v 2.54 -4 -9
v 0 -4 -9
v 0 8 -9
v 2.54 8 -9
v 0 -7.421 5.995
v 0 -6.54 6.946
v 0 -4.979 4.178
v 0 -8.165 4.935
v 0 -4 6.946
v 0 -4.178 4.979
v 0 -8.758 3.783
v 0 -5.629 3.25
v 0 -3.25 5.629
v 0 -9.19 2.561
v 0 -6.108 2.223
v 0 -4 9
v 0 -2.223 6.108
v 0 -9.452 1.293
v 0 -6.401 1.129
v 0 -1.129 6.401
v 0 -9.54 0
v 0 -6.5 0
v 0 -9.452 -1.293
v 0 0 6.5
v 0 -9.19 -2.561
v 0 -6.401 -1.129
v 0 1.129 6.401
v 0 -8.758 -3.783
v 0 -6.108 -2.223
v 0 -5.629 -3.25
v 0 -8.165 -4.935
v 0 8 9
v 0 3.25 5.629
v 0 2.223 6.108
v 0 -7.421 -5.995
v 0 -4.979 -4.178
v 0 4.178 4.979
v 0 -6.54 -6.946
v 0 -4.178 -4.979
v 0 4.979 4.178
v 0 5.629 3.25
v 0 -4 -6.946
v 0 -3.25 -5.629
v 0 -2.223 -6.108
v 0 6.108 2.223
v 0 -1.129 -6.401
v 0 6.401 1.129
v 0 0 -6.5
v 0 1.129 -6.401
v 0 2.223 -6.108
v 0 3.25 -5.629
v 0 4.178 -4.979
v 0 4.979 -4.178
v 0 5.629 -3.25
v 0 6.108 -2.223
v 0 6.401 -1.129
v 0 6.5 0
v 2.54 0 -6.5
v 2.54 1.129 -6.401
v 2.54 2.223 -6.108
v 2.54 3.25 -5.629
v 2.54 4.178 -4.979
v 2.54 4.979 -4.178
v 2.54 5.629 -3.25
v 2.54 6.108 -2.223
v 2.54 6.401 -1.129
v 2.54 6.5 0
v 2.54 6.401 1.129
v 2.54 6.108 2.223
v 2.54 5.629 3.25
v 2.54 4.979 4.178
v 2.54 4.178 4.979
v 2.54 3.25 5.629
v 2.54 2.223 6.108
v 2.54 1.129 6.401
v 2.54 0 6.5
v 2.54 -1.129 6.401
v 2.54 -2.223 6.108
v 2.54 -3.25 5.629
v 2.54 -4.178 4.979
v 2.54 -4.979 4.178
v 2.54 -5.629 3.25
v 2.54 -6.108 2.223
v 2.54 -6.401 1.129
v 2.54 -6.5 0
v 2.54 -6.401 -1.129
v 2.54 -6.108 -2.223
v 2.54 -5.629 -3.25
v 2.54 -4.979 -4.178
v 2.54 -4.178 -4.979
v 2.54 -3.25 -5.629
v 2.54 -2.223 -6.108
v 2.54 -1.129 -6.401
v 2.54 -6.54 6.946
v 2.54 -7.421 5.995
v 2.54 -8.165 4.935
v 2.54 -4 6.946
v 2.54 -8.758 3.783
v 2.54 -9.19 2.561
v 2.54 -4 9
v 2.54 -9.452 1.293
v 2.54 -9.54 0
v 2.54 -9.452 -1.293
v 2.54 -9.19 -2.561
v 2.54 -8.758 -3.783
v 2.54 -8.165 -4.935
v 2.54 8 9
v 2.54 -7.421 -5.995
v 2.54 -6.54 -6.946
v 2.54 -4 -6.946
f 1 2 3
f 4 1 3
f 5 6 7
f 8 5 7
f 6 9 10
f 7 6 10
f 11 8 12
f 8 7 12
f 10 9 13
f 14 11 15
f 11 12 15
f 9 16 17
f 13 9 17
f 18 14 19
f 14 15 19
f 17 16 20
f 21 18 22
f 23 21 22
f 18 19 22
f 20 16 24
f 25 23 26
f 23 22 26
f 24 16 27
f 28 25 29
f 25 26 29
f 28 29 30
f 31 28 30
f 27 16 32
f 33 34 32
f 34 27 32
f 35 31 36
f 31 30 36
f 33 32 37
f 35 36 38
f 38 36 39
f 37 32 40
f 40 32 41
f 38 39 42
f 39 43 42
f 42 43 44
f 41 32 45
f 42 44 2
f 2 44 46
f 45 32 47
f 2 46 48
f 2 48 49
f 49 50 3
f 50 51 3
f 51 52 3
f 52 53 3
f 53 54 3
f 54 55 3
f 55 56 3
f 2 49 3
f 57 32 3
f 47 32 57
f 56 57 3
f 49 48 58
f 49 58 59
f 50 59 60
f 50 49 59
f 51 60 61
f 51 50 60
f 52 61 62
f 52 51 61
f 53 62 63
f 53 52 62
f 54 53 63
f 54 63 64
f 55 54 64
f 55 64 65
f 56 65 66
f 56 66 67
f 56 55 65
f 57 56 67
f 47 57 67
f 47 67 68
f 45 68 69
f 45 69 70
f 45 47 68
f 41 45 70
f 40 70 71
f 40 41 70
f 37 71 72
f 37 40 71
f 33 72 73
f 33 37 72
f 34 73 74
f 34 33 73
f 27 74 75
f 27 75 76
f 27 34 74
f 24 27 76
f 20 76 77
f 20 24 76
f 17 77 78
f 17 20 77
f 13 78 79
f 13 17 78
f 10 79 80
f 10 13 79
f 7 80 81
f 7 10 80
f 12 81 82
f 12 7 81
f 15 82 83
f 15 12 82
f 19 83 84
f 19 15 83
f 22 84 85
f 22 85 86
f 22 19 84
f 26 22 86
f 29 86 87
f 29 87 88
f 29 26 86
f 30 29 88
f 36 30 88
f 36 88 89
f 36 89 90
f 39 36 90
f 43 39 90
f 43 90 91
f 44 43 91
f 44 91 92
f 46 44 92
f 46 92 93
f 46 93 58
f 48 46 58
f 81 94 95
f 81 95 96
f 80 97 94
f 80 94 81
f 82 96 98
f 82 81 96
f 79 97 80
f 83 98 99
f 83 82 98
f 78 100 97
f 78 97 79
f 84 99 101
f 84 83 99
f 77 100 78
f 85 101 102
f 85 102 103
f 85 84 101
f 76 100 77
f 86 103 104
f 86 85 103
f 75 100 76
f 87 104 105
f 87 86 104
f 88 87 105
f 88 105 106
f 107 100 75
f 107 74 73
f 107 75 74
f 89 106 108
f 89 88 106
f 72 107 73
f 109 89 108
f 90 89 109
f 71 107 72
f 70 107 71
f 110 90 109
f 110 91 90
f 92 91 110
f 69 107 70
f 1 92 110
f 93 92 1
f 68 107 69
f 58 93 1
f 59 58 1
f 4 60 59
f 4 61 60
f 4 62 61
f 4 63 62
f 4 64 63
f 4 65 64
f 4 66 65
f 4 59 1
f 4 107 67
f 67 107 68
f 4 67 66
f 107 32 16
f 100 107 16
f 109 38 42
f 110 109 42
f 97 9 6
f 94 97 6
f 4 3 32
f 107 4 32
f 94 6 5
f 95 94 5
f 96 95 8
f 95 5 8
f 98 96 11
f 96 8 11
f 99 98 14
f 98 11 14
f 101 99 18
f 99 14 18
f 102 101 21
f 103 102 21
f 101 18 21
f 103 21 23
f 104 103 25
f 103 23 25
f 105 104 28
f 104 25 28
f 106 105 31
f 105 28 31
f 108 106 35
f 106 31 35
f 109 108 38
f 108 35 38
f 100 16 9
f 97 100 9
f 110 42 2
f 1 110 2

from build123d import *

# Parameters (mm, degrees)
SKETCH1_R  = 6.5
BASE_DEPTH = 2.54


with BuildPart() as part:
    # Sketch1 → Base (new body)
    with BuildSketch(Plane(origin=(0, 0, 0), x_dir=(0, 0, -1), z_dir=(1, 0, 0))):
        with BuildLine():
            Line((9, -4), (9, 8))
            Line((9, 8), (-9, 8))
            Line((-9, 8), (-9, -4))
            Line((-9, -4), (-6.945502142, -4))
            Line((-6.945502142, -4), (-6.945502142, -6.54))
            ThreePointArc((-6.945502142, -6.54), (0, -9.54), (6.945502142, -6.54))
            Line((6.945502142, -6.54), (6.945502142, -4))
            Line((6.945502142, -4), (9, -4))
        make_face()
        Circle(SKETCH1_R, mode=Mode.SUBTRACT)
    extrude(amount=BASE_DEPTH)


solid = part.part
